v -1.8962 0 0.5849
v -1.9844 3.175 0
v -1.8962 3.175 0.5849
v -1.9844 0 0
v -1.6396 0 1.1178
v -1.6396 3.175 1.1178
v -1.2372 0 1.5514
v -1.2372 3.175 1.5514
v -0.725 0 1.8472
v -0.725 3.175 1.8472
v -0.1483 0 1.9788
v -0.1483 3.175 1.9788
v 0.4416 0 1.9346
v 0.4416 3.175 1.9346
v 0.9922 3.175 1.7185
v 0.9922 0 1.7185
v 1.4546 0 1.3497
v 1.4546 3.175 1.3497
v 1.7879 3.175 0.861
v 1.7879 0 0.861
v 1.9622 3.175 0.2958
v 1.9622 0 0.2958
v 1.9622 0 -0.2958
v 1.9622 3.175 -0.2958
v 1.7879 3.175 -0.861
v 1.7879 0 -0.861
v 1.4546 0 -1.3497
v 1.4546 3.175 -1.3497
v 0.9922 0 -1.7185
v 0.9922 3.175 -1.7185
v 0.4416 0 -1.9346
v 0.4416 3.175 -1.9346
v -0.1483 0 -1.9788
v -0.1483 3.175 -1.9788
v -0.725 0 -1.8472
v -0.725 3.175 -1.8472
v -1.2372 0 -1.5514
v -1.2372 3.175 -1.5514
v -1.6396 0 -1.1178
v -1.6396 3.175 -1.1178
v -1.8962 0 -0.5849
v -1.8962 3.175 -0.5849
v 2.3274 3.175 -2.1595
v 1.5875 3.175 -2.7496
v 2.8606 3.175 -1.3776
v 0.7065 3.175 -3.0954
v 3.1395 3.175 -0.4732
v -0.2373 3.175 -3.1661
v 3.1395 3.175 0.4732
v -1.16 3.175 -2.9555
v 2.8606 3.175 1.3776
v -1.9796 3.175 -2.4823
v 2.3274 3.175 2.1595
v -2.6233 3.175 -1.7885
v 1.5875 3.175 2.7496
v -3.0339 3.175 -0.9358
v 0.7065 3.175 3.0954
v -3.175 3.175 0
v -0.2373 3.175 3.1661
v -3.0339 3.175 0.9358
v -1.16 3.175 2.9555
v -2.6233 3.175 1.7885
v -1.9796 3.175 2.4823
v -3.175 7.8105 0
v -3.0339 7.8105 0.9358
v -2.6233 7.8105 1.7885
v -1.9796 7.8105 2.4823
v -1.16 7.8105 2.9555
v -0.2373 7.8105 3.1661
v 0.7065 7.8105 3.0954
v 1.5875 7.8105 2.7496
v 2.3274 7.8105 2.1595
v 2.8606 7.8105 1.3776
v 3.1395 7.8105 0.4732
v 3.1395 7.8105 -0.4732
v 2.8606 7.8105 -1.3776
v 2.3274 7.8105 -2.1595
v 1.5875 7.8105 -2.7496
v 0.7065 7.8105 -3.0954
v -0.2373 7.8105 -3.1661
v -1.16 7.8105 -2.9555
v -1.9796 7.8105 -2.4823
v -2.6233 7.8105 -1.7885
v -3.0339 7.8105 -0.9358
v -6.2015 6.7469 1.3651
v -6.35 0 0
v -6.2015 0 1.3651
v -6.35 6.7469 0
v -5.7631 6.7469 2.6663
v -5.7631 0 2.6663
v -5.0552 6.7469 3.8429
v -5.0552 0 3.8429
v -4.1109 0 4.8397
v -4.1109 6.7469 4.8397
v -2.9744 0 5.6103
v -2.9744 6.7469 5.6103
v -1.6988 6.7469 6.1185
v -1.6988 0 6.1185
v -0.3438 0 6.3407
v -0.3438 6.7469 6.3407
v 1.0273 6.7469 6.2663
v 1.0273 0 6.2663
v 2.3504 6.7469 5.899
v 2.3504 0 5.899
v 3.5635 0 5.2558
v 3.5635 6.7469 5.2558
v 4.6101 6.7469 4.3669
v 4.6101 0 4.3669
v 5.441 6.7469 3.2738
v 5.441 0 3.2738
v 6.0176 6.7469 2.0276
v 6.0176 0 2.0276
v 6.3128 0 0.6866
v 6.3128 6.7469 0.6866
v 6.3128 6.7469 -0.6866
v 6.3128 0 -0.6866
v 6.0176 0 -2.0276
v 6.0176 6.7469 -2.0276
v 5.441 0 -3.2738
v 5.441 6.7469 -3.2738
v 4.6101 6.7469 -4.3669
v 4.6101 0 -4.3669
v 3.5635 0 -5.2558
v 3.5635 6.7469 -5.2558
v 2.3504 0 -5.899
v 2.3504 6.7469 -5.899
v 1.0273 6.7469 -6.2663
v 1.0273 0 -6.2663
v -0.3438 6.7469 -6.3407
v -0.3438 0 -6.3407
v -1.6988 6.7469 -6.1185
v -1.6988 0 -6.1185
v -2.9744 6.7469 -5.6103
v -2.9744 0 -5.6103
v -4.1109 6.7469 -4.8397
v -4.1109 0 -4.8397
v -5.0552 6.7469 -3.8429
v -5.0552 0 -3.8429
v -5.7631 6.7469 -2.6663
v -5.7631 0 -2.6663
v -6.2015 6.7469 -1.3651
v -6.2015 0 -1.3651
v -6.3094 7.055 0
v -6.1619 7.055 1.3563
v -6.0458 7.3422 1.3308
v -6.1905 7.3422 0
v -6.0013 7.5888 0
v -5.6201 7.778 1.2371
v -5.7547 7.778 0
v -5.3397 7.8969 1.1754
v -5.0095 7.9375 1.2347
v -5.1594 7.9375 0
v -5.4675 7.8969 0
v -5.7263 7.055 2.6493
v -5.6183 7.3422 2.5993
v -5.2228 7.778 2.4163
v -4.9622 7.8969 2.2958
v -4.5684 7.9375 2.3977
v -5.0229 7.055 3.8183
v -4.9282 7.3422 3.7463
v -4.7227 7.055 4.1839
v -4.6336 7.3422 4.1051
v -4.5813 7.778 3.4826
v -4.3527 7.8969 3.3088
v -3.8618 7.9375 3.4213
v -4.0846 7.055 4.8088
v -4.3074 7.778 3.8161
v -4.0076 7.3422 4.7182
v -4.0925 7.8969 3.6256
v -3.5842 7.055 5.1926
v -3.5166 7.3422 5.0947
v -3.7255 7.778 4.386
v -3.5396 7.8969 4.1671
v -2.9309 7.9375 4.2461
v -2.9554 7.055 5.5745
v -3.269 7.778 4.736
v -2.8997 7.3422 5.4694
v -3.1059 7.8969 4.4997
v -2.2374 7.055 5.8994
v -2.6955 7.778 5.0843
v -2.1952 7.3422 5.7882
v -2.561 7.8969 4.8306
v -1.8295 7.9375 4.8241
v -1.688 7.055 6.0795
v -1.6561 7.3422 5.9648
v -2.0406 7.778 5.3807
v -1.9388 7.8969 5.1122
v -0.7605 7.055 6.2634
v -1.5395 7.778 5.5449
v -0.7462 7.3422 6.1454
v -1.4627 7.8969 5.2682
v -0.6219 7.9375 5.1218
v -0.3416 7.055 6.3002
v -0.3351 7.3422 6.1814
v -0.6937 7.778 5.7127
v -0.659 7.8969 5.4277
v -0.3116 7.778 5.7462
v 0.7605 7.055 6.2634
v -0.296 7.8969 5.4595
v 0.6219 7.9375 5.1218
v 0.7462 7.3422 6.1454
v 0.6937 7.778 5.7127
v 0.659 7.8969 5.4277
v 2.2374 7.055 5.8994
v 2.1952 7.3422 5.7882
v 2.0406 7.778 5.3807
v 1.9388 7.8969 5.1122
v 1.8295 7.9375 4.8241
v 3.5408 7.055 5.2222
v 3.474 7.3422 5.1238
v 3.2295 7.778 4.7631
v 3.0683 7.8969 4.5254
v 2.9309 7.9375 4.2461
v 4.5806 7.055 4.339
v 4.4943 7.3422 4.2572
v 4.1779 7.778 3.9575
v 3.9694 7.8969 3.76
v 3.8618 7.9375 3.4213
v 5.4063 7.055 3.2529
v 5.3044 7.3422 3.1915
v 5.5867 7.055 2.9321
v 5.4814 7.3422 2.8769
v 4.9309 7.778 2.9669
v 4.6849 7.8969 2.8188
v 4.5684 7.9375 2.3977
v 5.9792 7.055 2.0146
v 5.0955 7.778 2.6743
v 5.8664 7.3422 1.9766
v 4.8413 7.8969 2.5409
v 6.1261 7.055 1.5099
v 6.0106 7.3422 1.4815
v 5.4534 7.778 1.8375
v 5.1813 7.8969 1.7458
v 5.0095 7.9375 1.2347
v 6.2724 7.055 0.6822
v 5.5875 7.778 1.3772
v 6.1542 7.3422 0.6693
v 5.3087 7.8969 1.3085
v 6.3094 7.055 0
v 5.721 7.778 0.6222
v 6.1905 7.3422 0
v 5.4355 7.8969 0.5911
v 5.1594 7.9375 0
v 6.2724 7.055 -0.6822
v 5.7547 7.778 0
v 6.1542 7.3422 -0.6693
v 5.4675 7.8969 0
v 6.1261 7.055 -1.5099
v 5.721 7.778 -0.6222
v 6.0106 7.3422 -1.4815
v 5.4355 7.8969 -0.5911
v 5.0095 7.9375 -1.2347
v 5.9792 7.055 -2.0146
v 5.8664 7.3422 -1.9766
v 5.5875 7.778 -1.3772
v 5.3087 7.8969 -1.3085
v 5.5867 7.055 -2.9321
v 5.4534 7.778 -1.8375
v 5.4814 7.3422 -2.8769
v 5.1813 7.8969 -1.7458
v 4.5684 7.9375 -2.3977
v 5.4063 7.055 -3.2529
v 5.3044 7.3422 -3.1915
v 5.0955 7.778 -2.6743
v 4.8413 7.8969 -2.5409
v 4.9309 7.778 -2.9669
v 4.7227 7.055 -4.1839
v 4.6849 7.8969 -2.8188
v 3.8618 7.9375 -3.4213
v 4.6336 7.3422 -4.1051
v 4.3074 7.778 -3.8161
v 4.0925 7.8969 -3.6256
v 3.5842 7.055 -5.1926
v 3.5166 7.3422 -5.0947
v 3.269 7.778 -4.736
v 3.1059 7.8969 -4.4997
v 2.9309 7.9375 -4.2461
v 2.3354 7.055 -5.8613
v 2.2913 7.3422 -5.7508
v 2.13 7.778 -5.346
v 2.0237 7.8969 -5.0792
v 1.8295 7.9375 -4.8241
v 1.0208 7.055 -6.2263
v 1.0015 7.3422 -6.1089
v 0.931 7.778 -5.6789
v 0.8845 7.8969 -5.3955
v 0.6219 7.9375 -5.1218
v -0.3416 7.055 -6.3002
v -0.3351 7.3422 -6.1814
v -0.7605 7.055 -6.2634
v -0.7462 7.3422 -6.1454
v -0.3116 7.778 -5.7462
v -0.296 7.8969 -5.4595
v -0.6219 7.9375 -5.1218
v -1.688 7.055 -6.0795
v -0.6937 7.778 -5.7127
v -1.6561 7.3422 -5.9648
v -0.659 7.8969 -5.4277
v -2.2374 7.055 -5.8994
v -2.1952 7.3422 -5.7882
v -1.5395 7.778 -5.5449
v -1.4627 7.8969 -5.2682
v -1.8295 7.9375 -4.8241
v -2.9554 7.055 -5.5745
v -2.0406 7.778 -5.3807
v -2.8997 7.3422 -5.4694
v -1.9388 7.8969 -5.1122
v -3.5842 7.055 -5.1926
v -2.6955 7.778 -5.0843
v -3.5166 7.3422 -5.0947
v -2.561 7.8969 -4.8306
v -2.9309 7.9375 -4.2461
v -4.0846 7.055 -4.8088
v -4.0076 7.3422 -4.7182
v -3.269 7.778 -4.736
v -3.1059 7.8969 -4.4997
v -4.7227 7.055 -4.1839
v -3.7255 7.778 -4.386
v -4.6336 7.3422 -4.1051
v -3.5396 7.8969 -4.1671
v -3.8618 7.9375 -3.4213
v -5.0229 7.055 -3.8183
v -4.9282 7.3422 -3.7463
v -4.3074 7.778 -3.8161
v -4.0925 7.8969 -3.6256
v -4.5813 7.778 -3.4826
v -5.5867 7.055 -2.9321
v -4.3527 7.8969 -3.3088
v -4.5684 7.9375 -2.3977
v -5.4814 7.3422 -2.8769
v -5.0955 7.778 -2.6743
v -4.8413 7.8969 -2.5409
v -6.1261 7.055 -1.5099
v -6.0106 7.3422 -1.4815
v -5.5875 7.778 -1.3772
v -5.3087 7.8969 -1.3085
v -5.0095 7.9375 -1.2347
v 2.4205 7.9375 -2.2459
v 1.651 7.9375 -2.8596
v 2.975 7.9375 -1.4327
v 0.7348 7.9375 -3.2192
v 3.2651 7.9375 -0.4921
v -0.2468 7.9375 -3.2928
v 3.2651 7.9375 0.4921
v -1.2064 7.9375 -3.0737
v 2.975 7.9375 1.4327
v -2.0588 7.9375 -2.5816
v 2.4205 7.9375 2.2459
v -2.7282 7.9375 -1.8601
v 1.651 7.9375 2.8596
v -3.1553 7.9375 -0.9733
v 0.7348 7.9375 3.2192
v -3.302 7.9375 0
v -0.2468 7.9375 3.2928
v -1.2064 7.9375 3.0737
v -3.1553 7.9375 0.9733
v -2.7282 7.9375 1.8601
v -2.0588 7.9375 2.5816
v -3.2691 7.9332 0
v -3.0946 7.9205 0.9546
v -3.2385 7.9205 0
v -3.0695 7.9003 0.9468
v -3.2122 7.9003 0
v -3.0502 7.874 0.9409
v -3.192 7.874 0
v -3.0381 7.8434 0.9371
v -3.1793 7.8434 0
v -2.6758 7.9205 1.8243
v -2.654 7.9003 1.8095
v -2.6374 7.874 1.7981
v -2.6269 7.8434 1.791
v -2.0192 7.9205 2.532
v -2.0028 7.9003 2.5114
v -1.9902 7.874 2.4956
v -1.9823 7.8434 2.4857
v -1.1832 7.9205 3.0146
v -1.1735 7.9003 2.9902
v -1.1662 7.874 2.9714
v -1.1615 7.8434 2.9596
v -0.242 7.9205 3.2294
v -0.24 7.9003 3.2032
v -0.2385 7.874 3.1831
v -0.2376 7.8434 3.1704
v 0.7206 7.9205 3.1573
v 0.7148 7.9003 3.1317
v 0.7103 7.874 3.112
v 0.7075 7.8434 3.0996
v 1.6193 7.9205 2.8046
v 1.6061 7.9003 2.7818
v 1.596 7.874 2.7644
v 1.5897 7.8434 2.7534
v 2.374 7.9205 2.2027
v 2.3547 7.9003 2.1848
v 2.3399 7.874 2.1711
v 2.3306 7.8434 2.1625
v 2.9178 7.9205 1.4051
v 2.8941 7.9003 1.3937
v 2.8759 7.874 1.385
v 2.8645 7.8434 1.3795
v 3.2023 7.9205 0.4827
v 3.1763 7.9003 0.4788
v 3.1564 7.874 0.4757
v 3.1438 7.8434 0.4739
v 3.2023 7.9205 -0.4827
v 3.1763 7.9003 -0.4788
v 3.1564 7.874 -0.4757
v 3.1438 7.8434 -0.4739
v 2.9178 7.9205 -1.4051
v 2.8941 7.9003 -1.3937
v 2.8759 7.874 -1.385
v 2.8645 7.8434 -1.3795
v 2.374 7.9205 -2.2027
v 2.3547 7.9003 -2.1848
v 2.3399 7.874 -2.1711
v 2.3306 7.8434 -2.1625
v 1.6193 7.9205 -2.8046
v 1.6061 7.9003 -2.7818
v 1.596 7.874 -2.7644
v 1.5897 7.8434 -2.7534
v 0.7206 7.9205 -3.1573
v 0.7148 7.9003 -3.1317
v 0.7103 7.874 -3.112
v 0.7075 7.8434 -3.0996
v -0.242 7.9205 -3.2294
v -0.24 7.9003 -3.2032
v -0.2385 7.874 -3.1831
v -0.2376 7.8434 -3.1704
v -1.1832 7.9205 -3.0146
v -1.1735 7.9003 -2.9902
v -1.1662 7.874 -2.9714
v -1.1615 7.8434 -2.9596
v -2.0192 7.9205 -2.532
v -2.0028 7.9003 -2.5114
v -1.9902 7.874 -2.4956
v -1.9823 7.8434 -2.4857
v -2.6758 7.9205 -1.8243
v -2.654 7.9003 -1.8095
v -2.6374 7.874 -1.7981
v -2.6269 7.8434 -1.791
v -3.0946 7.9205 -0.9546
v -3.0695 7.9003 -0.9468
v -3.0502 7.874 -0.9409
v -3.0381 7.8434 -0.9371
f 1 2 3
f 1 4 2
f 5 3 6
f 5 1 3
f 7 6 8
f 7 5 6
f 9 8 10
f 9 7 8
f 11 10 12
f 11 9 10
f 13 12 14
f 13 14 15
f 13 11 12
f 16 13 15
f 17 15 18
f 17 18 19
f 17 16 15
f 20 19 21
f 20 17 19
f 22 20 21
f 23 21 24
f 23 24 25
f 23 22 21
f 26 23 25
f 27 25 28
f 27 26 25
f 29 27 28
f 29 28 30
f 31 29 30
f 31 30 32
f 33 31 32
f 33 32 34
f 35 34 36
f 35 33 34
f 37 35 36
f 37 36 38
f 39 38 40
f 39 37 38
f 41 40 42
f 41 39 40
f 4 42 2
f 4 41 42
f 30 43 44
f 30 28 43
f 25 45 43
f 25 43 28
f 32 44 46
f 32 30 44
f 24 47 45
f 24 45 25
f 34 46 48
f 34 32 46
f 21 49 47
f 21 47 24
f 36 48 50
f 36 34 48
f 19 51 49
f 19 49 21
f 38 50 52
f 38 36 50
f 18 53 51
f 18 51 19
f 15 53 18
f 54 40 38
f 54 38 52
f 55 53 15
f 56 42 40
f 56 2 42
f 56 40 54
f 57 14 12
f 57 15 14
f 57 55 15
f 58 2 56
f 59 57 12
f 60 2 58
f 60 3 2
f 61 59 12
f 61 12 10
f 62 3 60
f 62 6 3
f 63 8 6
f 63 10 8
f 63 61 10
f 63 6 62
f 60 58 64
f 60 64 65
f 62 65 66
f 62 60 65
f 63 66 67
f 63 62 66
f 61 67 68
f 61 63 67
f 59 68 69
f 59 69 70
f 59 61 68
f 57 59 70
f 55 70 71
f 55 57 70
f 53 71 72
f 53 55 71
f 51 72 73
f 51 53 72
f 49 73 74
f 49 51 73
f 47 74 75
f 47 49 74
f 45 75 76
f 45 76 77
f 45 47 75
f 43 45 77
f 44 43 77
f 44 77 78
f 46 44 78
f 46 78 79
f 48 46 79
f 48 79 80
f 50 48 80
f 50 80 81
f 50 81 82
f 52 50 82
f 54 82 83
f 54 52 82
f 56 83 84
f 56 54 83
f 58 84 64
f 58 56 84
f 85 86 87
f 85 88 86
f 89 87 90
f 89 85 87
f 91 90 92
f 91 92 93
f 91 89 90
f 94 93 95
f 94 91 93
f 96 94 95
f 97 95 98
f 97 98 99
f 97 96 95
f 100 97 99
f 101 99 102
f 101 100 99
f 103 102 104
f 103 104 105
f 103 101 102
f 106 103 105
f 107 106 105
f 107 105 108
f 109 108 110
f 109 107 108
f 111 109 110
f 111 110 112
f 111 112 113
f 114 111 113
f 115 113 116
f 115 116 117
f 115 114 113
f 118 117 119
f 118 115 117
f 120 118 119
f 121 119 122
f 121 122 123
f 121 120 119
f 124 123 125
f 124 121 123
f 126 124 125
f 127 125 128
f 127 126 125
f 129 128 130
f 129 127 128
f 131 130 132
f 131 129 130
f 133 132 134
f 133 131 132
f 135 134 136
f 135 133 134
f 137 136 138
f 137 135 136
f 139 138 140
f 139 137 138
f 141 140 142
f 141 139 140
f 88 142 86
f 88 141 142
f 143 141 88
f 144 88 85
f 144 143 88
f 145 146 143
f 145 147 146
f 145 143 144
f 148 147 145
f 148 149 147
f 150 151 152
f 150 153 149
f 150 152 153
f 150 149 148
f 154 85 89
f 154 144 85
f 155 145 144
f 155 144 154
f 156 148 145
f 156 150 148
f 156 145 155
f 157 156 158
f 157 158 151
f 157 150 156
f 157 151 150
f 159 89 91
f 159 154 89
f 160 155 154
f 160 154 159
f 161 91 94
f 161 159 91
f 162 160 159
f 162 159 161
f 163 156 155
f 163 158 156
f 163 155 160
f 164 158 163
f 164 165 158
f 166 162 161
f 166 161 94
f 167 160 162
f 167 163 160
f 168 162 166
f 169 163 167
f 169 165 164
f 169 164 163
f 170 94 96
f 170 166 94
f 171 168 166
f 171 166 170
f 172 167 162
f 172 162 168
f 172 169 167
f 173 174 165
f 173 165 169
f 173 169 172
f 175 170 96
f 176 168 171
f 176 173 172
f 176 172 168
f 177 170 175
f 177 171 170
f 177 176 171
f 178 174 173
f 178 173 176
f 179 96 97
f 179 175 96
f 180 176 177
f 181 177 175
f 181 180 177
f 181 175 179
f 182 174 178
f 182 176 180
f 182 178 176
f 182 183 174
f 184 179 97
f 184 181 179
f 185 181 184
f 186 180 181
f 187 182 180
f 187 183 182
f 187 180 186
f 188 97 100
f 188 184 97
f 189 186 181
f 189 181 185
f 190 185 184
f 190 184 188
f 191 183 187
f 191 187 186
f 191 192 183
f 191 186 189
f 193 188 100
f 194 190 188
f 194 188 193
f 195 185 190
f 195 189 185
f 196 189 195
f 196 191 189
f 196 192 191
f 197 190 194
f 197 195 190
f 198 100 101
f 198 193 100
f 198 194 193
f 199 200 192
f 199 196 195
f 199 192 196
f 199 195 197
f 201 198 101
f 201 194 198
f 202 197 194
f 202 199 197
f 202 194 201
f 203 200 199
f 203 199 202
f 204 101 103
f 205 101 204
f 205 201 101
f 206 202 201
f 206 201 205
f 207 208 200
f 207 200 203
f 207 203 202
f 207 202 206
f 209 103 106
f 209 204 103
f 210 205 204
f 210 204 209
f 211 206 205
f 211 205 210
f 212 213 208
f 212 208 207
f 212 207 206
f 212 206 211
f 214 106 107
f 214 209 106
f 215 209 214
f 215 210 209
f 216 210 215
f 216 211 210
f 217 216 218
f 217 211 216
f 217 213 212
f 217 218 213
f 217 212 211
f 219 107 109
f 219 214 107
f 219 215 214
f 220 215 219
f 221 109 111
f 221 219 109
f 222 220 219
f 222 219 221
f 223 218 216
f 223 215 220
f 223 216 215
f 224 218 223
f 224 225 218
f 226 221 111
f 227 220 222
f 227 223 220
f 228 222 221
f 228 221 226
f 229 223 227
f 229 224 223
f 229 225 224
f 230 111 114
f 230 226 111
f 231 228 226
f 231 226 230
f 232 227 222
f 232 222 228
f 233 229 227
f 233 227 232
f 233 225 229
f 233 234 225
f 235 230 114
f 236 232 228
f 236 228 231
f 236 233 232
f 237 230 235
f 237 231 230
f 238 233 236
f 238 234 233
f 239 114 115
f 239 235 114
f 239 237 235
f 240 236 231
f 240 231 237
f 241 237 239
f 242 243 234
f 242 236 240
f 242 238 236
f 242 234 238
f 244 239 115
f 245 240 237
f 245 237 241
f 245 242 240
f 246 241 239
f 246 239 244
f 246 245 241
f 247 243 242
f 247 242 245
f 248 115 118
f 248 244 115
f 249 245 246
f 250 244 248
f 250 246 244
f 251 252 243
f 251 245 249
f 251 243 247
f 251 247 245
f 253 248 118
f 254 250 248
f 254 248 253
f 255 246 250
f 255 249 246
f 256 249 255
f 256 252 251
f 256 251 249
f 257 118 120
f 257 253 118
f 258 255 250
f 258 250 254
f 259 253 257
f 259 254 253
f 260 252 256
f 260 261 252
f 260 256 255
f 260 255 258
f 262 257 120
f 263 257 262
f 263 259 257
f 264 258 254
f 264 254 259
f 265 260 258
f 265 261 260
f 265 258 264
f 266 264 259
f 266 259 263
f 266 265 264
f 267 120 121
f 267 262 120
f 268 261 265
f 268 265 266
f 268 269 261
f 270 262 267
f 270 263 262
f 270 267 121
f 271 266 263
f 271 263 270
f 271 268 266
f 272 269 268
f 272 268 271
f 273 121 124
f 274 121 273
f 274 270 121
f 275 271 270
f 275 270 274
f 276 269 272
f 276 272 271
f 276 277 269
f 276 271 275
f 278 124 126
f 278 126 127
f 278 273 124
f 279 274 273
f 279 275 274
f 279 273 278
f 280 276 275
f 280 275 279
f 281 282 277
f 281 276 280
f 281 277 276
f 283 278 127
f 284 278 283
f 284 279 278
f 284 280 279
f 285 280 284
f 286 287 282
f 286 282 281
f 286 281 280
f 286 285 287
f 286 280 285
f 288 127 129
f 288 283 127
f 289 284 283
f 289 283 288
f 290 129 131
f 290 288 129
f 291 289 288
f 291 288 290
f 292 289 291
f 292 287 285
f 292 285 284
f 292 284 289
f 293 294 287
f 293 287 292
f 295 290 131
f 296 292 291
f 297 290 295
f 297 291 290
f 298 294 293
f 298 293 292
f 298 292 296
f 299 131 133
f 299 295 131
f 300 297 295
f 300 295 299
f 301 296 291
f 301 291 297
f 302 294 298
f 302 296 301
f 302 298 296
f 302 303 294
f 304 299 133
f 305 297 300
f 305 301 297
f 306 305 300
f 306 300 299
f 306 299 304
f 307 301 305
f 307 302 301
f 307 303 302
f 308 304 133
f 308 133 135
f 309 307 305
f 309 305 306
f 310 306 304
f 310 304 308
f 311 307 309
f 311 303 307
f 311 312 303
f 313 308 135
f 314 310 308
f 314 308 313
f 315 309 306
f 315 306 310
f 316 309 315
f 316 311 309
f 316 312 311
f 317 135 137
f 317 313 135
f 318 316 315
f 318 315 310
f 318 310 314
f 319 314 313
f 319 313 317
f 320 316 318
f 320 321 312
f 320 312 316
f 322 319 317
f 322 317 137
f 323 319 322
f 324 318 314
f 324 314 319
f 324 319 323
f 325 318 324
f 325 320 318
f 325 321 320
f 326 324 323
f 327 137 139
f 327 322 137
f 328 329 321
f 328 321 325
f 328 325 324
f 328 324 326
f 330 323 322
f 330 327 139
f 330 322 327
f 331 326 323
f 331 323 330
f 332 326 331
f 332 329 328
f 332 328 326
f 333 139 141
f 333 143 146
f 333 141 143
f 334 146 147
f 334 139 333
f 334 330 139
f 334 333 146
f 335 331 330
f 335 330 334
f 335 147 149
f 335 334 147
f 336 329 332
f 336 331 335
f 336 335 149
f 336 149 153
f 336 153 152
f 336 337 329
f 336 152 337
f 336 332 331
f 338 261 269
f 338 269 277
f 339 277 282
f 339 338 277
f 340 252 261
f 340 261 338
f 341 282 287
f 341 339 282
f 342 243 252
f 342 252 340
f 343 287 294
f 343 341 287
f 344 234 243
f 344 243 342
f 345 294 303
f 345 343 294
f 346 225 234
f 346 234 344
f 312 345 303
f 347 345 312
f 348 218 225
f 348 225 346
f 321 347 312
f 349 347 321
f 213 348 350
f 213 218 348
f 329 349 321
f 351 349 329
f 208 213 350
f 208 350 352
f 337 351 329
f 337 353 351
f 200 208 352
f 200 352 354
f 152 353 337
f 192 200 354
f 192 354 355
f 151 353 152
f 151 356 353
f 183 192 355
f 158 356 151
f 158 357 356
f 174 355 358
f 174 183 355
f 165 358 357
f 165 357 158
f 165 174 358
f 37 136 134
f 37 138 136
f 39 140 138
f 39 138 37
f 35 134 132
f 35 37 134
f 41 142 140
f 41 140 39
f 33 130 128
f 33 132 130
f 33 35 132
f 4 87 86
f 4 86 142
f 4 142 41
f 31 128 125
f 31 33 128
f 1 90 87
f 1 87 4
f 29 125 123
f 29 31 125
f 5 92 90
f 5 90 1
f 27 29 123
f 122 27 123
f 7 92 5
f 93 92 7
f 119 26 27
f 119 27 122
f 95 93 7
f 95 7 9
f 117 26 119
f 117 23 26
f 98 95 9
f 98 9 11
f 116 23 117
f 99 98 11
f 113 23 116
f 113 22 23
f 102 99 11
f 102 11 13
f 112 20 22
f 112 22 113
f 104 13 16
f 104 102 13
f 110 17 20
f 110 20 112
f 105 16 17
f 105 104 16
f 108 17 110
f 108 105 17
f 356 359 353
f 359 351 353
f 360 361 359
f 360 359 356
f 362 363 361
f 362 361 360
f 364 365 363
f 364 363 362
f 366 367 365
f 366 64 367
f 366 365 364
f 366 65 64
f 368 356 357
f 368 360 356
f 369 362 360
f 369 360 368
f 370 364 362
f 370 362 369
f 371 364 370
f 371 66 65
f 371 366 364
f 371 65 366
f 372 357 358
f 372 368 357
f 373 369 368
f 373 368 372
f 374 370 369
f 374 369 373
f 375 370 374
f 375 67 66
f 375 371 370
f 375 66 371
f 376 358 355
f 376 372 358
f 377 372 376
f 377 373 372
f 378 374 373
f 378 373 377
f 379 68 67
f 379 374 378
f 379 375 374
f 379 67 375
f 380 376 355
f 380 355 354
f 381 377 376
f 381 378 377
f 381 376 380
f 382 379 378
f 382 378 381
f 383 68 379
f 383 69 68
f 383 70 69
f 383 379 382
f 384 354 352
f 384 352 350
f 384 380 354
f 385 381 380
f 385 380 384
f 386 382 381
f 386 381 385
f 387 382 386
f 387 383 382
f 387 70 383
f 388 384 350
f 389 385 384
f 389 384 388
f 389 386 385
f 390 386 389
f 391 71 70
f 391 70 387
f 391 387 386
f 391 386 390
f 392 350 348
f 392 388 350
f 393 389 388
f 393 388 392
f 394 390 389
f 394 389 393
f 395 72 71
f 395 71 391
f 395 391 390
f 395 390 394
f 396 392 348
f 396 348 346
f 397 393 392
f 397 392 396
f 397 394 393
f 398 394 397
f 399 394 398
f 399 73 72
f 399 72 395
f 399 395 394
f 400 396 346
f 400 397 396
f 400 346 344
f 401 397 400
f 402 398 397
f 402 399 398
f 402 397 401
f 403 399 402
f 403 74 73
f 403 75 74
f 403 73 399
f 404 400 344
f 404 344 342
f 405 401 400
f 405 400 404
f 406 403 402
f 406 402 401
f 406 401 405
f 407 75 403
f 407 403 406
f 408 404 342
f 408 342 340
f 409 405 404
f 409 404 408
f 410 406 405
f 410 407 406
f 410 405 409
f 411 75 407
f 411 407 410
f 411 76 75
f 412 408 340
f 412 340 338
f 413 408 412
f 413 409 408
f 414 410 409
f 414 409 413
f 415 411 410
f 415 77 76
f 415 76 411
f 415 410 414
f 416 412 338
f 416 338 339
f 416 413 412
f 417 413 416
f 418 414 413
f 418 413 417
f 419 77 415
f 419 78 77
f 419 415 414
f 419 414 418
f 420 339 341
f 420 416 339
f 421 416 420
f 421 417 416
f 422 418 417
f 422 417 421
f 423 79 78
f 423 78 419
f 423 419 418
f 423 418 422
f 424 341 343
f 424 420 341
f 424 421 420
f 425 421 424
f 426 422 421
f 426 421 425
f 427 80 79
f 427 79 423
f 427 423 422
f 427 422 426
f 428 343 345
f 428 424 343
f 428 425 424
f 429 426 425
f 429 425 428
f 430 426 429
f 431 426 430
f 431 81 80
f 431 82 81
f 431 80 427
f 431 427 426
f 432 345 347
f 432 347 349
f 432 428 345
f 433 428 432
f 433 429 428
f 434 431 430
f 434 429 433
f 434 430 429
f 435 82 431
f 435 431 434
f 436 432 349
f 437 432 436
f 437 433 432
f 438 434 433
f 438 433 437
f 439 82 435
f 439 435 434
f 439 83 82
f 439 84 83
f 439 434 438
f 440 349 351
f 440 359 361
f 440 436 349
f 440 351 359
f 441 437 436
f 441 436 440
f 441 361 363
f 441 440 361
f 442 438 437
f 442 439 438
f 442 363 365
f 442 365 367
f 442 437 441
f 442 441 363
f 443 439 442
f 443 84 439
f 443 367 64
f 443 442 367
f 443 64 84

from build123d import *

# Parameters (mm, degrees)
FILLET1_R = 0.127


with BuildPart() as part:
    # Sketch2 → Revolve1 (revolve)
    with BuildSketch(Plane.XY):
        with BuildLine():
            Line((-6.35, 0), (-6.35, 6.746875))
            ThreePointArc((-6.35, 6.746875), (-6.001274011, 7.588774011), (-5.159375, 7.9375))
            Line((-5.159375, 7.9375), (-3.175, 7.9375))
            Line((-3.175, 7.9375), (-3.175, 3.175))
            Line((-3.175, 3.175), (-1.984375, 3.175))
            Line((-1.984375, 3.175), (-1.984375, 0))
            Line((-1.984375, 0), (-6.35, 0))
        make_face()
    revolve(axis=Axis((0, 0, 0), (0, 1, 0)))

    # Fillet1
    fillet1_edges = [part.edges().sort_by_distance(p)[0] for p in [
        (3.175, 7.9375, 0),
    ]]
    fillet(fillet1_edges, radius=FILLET1_R)


solid = part.part
